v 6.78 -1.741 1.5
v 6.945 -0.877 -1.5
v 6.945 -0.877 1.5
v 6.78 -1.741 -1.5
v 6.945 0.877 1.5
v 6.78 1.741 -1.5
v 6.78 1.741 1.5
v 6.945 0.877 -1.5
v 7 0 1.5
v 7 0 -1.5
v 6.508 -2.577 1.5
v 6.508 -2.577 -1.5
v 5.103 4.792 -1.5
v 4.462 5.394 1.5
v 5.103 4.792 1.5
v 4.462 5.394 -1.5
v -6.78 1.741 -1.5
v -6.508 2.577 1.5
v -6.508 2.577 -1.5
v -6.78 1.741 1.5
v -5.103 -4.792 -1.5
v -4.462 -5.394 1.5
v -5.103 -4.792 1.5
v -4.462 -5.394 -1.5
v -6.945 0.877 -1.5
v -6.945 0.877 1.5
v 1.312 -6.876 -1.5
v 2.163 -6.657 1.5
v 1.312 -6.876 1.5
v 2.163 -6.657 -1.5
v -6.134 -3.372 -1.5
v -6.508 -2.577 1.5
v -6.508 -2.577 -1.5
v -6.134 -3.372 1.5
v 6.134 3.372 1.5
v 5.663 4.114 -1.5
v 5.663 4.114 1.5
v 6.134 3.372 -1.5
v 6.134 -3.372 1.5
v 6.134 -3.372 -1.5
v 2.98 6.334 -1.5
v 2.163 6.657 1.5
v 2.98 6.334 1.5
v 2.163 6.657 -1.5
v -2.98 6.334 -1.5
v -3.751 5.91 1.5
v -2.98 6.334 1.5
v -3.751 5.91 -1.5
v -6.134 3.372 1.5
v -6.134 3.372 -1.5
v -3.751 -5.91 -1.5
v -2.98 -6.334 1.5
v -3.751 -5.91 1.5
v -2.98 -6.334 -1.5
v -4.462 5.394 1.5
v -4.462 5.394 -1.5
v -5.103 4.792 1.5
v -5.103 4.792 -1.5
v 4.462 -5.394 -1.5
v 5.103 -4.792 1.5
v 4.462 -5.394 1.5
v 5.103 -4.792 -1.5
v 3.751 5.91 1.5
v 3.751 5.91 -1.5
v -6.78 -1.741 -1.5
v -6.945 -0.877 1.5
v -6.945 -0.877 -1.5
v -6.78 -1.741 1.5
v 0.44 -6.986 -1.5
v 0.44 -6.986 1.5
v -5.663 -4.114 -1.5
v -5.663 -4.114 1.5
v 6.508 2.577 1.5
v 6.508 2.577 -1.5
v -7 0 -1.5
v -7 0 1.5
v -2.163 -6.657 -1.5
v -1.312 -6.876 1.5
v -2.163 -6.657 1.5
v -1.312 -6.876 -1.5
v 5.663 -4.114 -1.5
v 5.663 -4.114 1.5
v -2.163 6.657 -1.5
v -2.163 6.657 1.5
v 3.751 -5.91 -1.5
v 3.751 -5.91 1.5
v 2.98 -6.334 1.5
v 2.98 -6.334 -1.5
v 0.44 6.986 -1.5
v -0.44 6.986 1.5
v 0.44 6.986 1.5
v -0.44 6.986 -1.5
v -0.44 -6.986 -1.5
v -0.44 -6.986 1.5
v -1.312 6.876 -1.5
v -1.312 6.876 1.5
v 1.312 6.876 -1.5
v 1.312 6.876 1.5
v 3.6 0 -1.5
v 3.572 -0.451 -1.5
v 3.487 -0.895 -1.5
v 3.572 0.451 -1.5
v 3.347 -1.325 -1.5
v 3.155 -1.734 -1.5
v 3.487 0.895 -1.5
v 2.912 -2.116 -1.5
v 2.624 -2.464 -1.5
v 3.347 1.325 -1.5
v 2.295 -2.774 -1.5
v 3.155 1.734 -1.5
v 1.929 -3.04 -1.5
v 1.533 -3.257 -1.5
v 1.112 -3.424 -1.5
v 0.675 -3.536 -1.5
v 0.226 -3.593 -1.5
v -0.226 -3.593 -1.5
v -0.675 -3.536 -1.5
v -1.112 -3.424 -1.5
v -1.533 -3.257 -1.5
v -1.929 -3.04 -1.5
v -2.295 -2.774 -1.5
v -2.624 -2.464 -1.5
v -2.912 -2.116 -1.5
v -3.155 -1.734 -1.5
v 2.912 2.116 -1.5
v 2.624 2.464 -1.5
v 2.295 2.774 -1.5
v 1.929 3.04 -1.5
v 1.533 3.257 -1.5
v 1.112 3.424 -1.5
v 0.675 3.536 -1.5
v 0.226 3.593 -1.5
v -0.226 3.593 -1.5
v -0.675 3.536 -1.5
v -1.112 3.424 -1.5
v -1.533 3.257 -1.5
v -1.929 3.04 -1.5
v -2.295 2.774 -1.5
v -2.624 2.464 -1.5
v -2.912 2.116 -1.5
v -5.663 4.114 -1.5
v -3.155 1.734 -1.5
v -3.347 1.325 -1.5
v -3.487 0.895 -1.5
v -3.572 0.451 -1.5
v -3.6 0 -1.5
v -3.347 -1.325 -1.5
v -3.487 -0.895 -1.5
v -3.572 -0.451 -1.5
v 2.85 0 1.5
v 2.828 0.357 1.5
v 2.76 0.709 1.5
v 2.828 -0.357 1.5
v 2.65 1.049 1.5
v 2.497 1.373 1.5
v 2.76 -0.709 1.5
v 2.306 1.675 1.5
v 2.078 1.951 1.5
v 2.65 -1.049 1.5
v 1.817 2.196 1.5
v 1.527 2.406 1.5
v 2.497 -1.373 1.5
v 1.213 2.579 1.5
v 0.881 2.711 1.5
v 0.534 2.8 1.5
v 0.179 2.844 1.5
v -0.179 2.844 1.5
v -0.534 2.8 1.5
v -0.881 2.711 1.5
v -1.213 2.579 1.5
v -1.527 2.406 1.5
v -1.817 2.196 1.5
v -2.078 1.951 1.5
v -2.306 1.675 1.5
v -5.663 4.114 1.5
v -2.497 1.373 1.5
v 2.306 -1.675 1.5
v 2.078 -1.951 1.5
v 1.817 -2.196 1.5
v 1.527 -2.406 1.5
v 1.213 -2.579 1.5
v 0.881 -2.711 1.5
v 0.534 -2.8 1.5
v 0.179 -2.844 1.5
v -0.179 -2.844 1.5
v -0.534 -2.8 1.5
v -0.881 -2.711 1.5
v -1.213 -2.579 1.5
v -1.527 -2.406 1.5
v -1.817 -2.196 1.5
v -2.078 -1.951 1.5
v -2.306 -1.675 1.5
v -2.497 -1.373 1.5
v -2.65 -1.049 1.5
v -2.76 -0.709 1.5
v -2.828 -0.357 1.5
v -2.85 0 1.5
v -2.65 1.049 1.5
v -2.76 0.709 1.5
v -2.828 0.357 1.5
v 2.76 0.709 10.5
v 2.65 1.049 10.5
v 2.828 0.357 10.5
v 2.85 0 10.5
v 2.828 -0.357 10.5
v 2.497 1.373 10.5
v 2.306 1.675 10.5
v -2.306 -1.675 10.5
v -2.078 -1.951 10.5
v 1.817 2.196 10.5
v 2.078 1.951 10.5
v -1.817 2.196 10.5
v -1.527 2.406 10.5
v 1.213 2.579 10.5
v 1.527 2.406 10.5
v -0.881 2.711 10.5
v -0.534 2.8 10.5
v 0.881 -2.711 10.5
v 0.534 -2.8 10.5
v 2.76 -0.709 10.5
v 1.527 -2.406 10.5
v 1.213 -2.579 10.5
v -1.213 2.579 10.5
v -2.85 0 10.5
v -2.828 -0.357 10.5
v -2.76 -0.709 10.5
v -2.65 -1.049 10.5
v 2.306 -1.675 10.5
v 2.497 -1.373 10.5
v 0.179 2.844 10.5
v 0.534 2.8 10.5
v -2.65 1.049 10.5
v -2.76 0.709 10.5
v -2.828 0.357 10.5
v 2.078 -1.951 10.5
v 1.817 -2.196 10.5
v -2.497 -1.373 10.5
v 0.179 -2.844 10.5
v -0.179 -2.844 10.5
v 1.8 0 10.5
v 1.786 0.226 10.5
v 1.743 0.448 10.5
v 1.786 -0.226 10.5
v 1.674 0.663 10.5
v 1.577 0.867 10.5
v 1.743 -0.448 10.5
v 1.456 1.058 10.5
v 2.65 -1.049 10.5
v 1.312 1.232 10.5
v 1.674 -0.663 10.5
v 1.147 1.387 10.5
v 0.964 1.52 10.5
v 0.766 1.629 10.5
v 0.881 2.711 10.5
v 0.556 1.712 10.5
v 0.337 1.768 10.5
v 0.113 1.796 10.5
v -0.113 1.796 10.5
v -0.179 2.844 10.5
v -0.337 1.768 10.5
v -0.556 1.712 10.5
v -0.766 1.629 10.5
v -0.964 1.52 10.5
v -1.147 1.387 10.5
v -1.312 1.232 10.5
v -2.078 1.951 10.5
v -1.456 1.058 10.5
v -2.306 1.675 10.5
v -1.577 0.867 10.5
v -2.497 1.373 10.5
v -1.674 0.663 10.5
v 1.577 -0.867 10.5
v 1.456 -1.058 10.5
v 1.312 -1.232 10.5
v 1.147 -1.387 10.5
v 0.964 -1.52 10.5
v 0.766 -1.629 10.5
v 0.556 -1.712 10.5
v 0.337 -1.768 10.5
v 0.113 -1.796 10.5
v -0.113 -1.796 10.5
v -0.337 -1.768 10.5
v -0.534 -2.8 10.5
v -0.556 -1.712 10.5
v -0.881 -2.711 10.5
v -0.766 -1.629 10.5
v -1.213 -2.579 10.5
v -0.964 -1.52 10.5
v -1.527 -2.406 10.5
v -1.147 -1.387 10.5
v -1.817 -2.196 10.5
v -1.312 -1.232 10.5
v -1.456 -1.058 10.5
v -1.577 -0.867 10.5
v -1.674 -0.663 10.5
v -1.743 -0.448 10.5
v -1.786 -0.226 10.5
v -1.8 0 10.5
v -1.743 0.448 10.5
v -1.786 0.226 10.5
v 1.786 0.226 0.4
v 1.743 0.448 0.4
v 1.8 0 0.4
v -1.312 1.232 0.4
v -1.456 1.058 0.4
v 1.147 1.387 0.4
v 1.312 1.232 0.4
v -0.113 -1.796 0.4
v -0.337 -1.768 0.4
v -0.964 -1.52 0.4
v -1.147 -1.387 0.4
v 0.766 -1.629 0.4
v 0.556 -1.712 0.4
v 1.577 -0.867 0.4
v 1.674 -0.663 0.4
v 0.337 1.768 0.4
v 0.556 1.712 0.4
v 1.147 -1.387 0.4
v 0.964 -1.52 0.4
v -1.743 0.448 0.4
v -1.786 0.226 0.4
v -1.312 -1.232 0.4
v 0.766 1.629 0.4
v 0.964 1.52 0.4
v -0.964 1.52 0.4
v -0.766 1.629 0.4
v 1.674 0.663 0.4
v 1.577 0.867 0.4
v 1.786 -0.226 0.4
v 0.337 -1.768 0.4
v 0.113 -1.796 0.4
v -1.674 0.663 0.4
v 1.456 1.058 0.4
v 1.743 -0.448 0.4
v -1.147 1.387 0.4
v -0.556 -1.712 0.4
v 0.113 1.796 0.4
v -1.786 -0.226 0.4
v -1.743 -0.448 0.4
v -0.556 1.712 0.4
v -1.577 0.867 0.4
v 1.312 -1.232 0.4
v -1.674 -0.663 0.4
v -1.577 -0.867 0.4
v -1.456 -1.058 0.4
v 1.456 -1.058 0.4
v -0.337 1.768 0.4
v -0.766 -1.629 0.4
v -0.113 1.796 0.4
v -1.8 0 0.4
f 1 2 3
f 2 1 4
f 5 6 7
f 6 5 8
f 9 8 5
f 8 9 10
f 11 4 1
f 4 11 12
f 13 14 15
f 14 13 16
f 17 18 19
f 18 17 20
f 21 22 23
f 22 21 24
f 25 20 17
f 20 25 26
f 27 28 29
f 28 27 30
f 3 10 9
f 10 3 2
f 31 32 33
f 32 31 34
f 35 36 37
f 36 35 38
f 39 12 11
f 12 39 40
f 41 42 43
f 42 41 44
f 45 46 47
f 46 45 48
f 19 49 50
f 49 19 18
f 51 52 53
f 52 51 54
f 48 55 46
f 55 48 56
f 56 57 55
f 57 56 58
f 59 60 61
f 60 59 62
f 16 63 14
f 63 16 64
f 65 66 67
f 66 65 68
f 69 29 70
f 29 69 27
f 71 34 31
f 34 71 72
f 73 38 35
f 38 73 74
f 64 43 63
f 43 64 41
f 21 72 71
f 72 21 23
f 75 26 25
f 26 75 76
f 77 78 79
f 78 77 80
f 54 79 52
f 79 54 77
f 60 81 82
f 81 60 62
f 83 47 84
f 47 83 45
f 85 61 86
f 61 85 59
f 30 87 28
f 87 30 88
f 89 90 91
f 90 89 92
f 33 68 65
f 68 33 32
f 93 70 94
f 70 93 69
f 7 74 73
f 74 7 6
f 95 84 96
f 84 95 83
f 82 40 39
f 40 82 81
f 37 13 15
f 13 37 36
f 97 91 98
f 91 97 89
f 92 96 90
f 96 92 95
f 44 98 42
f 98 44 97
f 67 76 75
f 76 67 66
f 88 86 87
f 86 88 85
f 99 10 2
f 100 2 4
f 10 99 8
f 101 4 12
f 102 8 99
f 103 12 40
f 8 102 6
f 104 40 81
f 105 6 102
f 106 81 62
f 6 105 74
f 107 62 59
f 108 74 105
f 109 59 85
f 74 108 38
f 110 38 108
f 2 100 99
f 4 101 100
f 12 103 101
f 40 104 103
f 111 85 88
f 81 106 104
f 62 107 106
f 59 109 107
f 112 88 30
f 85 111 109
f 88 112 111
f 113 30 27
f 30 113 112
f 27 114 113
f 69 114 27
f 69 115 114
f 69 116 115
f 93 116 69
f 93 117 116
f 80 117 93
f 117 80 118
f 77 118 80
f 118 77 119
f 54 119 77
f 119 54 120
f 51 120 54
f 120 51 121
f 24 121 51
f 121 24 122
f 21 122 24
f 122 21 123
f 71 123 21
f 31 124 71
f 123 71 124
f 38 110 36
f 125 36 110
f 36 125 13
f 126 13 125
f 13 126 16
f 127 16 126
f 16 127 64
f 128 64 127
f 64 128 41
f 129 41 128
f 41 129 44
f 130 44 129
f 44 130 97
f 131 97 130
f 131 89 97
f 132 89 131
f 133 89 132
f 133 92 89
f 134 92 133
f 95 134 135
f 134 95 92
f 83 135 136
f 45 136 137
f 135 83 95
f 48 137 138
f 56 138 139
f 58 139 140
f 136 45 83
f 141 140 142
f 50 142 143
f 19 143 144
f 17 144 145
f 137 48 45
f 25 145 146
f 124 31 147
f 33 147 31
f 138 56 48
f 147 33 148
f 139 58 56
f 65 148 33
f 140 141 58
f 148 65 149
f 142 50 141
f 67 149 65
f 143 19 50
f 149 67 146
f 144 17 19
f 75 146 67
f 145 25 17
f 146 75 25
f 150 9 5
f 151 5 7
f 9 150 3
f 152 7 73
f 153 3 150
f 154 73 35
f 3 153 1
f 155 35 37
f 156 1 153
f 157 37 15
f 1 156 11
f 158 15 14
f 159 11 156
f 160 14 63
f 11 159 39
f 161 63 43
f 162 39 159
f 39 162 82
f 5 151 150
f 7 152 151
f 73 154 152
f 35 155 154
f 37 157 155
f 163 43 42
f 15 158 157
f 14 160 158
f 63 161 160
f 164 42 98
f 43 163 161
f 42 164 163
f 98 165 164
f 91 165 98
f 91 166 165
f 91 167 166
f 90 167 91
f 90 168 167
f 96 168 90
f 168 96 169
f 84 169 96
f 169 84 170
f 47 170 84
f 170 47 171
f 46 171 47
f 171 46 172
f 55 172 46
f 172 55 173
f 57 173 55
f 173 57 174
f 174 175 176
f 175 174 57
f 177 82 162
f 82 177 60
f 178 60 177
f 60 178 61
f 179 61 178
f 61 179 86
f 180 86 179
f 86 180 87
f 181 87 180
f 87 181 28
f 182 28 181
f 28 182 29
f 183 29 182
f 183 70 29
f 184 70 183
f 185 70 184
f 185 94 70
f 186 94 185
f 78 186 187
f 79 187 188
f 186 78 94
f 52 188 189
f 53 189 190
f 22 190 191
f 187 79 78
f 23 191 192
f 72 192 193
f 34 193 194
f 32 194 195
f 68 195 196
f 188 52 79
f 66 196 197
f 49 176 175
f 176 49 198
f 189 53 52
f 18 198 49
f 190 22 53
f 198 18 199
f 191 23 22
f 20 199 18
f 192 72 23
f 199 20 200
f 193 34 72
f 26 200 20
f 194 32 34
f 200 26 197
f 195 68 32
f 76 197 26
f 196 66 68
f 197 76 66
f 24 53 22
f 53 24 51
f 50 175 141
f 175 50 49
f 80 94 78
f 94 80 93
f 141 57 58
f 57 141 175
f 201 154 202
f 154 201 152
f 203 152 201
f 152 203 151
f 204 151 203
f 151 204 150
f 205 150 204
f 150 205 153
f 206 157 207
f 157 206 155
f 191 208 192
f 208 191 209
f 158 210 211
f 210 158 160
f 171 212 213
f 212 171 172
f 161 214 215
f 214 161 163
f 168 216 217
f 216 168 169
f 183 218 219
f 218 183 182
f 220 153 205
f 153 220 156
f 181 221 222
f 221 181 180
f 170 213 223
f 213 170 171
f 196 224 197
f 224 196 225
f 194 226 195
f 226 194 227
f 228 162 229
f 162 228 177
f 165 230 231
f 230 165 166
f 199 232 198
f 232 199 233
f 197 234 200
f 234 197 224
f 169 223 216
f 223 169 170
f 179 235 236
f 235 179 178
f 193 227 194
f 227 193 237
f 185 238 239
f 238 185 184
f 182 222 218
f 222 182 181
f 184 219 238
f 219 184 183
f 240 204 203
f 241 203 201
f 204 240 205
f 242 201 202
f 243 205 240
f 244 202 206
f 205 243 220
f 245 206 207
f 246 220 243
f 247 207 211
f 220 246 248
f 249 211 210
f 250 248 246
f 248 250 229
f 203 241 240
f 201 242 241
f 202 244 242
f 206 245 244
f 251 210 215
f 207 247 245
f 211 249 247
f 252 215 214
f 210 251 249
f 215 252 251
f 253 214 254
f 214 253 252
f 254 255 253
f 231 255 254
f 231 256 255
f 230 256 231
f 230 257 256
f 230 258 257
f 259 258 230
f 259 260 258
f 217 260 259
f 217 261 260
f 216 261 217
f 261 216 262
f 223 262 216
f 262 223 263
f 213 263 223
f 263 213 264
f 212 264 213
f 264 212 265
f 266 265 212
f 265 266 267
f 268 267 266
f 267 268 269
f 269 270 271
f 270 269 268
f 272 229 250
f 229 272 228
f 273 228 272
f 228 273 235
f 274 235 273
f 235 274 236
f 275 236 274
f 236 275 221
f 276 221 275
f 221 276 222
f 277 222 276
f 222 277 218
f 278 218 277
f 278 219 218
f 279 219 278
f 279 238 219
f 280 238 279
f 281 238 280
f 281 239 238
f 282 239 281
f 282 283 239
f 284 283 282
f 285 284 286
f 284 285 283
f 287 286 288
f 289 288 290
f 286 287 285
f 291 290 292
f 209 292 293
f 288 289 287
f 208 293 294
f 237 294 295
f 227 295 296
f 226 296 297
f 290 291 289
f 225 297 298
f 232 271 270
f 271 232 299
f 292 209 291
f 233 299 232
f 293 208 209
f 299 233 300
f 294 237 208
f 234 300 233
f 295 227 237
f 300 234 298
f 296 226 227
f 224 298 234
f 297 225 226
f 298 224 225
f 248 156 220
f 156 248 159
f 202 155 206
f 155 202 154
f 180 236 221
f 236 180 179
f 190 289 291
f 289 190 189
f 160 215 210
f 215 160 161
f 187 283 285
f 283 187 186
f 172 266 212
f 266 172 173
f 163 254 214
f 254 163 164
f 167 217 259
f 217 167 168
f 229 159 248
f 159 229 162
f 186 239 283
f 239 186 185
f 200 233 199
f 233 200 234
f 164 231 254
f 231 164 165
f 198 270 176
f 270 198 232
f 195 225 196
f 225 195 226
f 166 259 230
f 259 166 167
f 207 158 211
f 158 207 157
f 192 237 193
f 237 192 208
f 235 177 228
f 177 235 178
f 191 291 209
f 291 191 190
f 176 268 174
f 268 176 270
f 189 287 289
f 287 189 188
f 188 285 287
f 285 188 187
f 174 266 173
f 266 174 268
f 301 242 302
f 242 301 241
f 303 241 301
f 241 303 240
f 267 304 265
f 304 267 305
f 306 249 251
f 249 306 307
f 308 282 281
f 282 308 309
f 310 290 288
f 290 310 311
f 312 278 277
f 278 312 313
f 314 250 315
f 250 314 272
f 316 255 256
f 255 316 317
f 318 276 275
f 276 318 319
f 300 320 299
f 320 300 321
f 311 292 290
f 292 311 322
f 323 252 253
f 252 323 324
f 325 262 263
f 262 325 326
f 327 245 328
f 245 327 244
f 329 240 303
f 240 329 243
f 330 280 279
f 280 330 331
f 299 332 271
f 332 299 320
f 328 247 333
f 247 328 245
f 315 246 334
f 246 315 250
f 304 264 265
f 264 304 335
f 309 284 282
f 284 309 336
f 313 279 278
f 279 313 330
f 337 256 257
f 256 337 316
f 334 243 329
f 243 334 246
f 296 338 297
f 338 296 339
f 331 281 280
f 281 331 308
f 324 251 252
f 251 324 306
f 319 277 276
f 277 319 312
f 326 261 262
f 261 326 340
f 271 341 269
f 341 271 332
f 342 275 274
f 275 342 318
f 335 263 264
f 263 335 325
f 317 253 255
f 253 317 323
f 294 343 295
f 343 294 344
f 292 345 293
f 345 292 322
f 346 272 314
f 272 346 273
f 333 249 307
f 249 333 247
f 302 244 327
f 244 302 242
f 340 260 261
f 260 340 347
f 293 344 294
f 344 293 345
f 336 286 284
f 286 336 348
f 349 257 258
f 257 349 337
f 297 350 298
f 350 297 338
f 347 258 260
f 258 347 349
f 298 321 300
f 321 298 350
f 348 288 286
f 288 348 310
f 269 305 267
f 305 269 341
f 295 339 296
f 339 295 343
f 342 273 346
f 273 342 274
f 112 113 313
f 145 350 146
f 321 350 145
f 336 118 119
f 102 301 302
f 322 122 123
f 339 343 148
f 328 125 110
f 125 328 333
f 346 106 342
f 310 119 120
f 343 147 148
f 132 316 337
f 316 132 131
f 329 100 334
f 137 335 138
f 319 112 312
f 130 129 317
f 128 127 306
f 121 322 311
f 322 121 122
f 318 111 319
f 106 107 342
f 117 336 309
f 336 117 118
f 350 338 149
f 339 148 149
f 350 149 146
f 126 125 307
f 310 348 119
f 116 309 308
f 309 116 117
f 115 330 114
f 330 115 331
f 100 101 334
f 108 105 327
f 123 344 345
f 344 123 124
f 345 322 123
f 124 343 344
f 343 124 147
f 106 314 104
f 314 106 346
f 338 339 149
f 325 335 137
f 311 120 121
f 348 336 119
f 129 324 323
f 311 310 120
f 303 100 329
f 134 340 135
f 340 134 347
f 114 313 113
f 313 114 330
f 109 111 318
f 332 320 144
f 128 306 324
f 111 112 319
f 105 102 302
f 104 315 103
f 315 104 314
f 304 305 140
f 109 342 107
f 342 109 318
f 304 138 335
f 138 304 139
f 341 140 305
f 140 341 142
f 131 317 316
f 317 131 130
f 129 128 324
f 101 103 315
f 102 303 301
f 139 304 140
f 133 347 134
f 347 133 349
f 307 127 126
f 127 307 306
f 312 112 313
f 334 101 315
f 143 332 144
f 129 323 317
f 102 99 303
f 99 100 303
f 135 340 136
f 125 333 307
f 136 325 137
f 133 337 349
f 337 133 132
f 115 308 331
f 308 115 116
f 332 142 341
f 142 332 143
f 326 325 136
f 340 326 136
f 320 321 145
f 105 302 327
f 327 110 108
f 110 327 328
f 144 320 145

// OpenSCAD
$fn = 50;


difference() {
	union() {
		translate(v = [0, 0, -1.5000000000]) {
			rotate(a = [0, 0, 0]) {
				cylinder(h = 3, r = 7.0000000000);
			}
		}
		translate(v = [0, 0, -1.5000000000]) {
			rotate(a = [0, 0, 0]) {
				cylinder(h = 12, r = 2.8500000000);
			}
		}
	}
	union() {
		translate(v = [0, 0, -125.0000000000]) {
			rotate(a = [0, 0, 0]) {
				cylinder(h = 250, r = 1.8000000000);
			}
		}
		#translate(v = [0, 0, 0.4000000000]) {
			rotate(a = [0, 180, 0]) {
				cylinder(h = 1.9000000000, r1 = 1.8000000000, r2 = 3.6000000000);
			}
		}
		#translate(v = [0, 0, 10.5000000000]) {
			rotate(a = [0, 180, 0]) {
				cylinder(h = 12, r = 1.8000000000);
			}
		}
	}
}
